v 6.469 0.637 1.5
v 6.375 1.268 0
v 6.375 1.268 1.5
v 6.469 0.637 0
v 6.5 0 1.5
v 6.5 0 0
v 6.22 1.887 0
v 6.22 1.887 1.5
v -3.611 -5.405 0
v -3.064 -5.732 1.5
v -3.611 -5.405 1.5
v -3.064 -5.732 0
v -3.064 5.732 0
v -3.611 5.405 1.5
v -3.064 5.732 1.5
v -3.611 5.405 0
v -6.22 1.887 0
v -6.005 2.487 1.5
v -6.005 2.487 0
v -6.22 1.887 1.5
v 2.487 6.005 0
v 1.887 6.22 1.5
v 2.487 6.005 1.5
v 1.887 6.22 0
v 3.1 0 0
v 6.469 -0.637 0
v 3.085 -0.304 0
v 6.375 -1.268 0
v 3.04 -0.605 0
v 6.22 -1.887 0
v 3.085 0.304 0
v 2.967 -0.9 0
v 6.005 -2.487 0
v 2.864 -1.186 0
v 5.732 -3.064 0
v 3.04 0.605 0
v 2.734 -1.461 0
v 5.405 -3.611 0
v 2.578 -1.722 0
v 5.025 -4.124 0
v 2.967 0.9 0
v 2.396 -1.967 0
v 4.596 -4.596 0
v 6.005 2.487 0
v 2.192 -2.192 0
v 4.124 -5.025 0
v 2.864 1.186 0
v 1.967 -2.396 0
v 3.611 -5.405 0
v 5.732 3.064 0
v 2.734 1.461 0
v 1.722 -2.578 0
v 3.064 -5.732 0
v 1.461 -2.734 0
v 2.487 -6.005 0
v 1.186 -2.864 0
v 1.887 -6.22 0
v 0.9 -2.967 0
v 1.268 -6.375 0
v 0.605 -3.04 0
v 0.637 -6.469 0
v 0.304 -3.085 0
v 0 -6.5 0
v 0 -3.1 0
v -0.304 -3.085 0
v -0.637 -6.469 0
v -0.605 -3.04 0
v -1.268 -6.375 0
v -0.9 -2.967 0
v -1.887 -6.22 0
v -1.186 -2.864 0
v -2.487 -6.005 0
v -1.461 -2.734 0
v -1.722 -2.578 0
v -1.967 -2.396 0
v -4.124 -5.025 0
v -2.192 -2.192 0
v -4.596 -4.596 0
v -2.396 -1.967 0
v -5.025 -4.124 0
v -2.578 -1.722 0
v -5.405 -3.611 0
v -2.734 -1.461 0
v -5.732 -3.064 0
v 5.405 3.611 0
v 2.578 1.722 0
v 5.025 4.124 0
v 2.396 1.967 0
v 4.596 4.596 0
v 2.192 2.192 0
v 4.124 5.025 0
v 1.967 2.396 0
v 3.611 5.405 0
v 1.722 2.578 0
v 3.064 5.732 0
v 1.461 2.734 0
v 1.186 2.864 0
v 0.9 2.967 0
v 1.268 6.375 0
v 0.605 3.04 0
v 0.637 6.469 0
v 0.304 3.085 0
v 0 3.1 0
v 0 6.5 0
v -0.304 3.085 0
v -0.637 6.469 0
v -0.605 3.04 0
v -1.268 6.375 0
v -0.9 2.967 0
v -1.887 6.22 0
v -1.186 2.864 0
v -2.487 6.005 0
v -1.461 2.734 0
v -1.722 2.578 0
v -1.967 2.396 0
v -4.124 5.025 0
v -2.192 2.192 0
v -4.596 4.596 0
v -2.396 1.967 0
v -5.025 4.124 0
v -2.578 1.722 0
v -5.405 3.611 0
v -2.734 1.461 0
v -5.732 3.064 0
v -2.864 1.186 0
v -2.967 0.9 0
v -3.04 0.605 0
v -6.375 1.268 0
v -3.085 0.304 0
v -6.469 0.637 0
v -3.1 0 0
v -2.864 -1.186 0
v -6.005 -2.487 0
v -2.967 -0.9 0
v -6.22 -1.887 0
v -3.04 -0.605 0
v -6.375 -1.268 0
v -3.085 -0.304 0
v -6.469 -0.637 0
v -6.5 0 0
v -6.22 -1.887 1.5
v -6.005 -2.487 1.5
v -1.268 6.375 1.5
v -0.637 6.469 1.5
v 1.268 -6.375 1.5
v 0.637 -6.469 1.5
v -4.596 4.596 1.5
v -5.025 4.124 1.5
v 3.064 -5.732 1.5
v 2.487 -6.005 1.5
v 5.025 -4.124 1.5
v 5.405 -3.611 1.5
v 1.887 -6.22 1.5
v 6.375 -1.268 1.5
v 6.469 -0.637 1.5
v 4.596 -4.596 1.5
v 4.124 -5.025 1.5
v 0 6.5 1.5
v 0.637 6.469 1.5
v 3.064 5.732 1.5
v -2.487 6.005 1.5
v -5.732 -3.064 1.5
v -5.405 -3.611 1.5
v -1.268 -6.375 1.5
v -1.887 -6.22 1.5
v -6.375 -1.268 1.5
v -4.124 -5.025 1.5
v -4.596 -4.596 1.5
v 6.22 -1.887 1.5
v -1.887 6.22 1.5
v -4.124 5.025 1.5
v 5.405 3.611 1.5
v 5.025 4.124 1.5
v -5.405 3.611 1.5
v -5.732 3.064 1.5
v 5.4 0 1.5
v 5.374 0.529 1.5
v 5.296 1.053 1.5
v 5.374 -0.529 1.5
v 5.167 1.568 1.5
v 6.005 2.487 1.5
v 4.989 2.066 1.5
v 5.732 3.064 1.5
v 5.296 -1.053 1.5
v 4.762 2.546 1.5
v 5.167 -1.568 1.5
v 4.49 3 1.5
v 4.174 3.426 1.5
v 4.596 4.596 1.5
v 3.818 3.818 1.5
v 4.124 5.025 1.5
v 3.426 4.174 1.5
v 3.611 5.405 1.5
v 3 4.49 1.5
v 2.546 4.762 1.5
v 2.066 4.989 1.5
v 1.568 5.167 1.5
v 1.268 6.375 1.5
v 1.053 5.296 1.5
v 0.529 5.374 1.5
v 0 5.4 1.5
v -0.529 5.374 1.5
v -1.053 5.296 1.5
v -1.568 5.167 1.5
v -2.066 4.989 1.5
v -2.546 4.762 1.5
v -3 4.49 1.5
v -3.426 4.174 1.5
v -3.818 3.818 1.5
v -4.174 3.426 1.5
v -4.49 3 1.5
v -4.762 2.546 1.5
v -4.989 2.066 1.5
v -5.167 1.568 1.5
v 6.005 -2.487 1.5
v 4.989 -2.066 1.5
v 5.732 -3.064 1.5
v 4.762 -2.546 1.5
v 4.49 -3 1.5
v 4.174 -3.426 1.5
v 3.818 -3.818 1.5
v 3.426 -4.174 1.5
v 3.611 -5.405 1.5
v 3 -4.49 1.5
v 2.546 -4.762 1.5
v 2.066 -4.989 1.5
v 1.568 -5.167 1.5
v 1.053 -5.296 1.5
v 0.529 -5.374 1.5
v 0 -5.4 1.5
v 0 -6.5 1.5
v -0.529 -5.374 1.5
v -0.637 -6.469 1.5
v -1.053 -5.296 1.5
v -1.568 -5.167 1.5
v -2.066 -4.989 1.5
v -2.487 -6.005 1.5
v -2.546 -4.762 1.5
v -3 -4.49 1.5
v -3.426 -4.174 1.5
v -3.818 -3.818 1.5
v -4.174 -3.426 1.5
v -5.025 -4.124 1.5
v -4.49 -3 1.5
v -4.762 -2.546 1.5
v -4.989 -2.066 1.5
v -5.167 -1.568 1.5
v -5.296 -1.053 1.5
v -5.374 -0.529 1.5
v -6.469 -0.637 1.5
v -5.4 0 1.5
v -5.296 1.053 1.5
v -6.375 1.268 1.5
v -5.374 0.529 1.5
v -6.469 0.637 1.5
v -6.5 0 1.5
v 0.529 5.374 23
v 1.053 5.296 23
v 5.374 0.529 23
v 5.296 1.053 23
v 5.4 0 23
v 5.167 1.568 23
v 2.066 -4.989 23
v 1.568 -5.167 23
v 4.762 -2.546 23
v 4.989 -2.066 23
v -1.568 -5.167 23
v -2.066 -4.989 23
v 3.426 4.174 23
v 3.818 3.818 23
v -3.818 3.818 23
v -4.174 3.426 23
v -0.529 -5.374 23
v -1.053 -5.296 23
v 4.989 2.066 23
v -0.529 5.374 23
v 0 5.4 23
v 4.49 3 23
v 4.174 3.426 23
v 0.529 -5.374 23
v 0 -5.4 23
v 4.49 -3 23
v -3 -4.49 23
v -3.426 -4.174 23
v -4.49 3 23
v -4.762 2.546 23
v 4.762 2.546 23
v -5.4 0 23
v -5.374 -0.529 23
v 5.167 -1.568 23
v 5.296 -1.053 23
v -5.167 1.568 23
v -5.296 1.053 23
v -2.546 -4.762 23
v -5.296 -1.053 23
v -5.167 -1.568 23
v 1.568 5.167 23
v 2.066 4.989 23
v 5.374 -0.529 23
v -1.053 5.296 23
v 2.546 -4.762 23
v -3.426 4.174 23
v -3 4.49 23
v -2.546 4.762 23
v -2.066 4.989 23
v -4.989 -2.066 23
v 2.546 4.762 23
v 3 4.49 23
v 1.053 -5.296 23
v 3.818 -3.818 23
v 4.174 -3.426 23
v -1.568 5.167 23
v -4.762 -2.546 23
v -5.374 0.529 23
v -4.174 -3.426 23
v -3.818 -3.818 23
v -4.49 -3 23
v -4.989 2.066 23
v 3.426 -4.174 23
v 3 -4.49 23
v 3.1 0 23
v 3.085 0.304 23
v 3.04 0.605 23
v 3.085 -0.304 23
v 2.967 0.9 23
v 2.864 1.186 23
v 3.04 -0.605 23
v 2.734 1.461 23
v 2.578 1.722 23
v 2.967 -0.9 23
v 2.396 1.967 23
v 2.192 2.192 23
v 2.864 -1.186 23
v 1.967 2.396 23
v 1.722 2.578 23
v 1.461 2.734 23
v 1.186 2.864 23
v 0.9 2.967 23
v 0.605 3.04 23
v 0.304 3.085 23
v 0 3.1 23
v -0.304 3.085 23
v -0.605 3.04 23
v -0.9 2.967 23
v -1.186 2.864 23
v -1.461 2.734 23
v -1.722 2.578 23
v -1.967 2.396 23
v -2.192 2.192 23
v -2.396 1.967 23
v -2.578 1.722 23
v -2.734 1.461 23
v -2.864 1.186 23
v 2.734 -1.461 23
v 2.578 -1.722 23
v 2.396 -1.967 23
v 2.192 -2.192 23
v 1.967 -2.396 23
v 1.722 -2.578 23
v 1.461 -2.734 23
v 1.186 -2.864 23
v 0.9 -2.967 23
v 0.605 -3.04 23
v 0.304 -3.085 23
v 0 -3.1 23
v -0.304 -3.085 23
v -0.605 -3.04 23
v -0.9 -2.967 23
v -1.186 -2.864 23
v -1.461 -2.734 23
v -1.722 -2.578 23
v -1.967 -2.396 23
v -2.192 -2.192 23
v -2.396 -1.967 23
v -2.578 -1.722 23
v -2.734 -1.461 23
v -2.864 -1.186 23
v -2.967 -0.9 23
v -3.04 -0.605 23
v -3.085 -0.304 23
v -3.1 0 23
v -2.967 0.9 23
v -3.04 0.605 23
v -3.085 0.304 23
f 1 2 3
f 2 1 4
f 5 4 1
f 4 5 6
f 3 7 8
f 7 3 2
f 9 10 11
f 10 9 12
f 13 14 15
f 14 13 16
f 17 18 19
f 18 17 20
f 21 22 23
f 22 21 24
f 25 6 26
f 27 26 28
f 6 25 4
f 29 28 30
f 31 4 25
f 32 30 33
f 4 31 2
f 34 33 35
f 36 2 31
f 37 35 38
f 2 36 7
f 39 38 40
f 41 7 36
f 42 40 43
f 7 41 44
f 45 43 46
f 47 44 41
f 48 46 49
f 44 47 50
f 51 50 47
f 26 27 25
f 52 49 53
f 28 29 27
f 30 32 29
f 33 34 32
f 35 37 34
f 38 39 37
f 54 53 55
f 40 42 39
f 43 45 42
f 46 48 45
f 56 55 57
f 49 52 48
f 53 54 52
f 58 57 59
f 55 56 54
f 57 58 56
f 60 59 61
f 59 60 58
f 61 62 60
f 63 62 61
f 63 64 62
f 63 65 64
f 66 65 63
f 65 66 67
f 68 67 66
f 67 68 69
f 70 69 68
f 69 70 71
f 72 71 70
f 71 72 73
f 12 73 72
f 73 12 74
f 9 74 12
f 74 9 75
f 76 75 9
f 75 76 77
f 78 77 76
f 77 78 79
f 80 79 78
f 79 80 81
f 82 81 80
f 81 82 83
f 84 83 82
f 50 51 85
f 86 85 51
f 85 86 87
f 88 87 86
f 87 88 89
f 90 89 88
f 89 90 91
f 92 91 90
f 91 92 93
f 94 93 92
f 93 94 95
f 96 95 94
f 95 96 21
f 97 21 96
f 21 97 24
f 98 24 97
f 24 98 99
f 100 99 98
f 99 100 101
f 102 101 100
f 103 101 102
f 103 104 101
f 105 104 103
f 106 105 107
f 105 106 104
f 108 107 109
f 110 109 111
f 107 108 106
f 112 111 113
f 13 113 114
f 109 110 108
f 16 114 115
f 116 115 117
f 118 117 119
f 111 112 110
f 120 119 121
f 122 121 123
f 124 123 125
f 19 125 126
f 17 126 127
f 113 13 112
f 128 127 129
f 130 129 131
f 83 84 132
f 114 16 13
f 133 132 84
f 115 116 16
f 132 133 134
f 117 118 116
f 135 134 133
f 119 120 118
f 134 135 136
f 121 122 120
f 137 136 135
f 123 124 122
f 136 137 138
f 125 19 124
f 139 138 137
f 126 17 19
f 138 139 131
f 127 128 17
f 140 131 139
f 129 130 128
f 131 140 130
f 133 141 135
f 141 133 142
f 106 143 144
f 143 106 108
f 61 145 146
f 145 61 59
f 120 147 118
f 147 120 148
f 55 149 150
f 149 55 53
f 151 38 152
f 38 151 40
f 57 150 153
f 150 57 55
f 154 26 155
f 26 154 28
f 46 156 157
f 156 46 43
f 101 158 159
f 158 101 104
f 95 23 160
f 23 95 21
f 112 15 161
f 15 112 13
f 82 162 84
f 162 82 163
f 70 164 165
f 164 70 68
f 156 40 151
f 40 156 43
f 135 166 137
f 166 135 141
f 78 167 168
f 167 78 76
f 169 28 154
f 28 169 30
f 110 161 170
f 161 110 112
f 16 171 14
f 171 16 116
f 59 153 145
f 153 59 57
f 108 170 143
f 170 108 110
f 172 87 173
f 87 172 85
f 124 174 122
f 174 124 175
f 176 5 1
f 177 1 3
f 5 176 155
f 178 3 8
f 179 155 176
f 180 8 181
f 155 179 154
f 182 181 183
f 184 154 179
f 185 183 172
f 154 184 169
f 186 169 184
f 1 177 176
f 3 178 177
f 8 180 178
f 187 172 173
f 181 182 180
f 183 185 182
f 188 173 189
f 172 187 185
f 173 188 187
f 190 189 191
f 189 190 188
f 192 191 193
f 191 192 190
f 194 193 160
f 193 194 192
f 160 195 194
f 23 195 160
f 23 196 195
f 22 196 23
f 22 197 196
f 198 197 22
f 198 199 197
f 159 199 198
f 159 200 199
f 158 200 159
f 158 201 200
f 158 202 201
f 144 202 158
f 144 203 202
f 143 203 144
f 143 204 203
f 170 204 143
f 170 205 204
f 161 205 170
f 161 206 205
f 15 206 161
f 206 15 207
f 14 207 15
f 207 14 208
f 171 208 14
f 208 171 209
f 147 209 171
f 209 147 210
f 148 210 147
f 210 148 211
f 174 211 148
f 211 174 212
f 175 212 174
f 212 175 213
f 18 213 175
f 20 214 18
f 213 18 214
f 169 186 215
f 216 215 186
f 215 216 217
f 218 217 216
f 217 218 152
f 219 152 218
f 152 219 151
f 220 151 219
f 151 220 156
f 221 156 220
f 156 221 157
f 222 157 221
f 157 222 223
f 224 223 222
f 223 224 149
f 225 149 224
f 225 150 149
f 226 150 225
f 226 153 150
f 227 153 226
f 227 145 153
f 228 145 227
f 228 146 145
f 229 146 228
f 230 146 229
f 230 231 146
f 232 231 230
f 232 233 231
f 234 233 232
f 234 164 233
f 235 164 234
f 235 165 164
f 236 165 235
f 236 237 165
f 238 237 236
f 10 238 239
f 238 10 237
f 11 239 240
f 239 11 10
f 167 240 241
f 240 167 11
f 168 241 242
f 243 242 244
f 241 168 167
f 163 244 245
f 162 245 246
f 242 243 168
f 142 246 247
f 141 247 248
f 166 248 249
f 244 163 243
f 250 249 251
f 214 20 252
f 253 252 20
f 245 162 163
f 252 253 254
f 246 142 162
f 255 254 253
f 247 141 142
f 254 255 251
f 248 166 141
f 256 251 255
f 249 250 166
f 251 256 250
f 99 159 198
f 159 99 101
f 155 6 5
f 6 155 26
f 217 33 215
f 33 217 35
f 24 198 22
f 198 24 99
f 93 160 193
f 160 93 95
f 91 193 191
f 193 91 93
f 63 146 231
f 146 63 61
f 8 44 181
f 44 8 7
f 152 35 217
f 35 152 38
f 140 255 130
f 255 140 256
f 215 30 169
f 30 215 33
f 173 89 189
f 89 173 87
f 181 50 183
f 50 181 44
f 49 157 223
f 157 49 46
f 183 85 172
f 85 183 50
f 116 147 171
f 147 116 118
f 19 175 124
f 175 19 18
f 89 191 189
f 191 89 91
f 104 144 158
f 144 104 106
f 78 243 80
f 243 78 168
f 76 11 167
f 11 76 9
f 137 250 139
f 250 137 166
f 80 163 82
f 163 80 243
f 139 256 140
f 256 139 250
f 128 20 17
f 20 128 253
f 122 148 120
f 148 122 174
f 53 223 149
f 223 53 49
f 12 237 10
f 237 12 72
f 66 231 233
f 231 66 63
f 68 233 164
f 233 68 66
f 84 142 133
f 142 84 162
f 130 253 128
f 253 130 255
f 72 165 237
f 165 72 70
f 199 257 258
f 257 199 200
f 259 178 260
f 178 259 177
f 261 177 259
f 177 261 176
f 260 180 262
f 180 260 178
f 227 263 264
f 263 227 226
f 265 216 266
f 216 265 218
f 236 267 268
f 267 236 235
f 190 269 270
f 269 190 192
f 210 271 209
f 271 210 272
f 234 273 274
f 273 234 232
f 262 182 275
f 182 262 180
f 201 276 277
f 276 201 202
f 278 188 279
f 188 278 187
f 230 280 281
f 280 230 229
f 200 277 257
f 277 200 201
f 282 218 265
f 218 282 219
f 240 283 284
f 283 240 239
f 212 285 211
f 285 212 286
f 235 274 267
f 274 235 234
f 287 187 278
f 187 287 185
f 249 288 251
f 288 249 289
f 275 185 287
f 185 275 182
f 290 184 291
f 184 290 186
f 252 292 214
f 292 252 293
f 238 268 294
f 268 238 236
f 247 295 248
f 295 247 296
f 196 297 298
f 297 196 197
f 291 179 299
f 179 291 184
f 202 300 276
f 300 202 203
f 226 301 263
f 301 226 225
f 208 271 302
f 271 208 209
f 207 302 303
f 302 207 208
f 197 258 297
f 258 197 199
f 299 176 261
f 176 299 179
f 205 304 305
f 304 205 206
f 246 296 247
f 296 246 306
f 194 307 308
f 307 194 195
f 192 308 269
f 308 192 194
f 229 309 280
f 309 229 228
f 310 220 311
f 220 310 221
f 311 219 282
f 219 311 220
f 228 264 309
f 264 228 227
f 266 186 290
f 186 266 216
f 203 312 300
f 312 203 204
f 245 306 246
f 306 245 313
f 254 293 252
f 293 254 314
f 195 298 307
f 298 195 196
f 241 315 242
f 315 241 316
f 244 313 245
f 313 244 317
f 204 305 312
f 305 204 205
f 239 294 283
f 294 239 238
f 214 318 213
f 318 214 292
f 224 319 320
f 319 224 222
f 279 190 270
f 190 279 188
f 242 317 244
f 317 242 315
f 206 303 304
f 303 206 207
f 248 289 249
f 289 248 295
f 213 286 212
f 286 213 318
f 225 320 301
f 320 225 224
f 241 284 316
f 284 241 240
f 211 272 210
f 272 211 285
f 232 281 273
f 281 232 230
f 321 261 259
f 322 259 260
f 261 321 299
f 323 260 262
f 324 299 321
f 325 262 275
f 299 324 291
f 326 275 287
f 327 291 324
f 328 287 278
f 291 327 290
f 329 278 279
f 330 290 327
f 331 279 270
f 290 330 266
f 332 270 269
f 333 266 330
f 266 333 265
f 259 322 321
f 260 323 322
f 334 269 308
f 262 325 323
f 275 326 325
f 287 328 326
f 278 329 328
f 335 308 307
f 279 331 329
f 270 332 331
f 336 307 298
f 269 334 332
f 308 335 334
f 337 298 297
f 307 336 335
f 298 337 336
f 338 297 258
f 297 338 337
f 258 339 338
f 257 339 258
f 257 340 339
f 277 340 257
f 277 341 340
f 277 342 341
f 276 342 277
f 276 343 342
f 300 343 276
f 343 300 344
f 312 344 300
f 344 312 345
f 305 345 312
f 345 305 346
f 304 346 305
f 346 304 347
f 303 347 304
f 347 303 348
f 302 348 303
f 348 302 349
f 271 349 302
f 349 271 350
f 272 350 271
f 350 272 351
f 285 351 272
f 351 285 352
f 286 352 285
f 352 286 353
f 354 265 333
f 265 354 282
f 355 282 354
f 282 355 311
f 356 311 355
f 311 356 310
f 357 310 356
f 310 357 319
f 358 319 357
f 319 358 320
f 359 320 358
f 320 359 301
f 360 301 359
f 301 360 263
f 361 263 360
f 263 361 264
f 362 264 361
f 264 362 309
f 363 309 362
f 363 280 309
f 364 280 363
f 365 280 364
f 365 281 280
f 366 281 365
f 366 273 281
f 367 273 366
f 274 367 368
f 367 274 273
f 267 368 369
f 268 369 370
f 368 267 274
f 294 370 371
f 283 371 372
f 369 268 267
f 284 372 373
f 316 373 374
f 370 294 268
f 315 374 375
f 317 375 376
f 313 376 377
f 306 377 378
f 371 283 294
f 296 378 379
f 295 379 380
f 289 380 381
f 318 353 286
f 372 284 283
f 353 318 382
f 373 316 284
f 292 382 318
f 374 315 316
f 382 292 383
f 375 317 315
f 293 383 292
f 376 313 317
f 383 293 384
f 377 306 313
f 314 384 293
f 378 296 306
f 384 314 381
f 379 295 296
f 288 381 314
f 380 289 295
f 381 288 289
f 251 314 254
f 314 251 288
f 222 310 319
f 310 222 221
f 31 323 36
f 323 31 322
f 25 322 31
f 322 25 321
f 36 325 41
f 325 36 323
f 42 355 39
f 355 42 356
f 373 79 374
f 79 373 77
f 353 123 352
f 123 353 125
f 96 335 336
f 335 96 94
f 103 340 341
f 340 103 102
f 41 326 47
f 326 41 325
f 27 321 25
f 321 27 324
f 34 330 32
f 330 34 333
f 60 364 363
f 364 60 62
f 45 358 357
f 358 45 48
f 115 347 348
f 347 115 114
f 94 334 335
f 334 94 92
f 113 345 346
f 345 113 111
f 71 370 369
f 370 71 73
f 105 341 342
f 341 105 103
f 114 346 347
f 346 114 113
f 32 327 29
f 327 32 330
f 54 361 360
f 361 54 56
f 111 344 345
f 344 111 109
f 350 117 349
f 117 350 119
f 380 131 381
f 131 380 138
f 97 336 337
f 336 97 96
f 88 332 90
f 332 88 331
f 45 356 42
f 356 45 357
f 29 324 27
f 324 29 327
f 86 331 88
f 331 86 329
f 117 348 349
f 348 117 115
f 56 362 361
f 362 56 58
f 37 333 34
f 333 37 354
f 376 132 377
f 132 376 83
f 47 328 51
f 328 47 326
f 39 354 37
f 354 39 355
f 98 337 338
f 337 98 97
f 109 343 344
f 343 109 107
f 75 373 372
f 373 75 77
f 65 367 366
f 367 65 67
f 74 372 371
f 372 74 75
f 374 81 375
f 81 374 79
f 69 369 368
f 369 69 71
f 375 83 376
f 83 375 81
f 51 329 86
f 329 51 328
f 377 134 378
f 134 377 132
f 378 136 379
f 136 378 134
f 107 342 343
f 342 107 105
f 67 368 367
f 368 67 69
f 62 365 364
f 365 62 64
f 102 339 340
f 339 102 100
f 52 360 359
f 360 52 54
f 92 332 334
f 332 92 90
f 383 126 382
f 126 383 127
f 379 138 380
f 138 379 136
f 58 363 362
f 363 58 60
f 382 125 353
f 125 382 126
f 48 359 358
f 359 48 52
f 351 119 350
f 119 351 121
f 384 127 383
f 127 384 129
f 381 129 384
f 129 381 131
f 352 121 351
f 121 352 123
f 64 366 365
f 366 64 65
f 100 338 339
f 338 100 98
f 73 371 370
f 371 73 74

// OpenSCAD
// Adapter sleeve: 0.2 mL PCR tube to 1.5 mL rack hole
// Dimensions measured with calipers

// Collar (base) dimensions
collar_diameter = 13;
collar_thickness = 1.5;

// Sleeve body dimensions
sleeve_outer_diameter = 10.8;
sleeve_height = 21.5;

// Bore (inner hole) dimensions
bore_diameter = 6.2;

// Total height of part
total_height = collar_thickness + sleeve_height;

// Resolution for curved shapes
$fn = 64;

// Correct structure: difference with solid then bore
difference() {
    // Solid part
    union() {
        // Collar: rests on bed from z=0 to z=1.5
        translate([0, 0, 0])
            cylinder(h = collar_thickness, r = collar_diameter / 2, center = false);
        
        // Sleeve body: rises from collar to z=21.5
        translate([0, 0, collar_thickness])
            cylinder(h = sleeve_height, r = sleeve_outer_diameter / 2, center = false);
    }
    
    // Bore hole: extends 1 mm below z=0 and 1 mm above z=total_height
    translate([0, 0, -1])
        cylinder(h = total_height + 2, r = bore_diameter / 2, center = false);
}
